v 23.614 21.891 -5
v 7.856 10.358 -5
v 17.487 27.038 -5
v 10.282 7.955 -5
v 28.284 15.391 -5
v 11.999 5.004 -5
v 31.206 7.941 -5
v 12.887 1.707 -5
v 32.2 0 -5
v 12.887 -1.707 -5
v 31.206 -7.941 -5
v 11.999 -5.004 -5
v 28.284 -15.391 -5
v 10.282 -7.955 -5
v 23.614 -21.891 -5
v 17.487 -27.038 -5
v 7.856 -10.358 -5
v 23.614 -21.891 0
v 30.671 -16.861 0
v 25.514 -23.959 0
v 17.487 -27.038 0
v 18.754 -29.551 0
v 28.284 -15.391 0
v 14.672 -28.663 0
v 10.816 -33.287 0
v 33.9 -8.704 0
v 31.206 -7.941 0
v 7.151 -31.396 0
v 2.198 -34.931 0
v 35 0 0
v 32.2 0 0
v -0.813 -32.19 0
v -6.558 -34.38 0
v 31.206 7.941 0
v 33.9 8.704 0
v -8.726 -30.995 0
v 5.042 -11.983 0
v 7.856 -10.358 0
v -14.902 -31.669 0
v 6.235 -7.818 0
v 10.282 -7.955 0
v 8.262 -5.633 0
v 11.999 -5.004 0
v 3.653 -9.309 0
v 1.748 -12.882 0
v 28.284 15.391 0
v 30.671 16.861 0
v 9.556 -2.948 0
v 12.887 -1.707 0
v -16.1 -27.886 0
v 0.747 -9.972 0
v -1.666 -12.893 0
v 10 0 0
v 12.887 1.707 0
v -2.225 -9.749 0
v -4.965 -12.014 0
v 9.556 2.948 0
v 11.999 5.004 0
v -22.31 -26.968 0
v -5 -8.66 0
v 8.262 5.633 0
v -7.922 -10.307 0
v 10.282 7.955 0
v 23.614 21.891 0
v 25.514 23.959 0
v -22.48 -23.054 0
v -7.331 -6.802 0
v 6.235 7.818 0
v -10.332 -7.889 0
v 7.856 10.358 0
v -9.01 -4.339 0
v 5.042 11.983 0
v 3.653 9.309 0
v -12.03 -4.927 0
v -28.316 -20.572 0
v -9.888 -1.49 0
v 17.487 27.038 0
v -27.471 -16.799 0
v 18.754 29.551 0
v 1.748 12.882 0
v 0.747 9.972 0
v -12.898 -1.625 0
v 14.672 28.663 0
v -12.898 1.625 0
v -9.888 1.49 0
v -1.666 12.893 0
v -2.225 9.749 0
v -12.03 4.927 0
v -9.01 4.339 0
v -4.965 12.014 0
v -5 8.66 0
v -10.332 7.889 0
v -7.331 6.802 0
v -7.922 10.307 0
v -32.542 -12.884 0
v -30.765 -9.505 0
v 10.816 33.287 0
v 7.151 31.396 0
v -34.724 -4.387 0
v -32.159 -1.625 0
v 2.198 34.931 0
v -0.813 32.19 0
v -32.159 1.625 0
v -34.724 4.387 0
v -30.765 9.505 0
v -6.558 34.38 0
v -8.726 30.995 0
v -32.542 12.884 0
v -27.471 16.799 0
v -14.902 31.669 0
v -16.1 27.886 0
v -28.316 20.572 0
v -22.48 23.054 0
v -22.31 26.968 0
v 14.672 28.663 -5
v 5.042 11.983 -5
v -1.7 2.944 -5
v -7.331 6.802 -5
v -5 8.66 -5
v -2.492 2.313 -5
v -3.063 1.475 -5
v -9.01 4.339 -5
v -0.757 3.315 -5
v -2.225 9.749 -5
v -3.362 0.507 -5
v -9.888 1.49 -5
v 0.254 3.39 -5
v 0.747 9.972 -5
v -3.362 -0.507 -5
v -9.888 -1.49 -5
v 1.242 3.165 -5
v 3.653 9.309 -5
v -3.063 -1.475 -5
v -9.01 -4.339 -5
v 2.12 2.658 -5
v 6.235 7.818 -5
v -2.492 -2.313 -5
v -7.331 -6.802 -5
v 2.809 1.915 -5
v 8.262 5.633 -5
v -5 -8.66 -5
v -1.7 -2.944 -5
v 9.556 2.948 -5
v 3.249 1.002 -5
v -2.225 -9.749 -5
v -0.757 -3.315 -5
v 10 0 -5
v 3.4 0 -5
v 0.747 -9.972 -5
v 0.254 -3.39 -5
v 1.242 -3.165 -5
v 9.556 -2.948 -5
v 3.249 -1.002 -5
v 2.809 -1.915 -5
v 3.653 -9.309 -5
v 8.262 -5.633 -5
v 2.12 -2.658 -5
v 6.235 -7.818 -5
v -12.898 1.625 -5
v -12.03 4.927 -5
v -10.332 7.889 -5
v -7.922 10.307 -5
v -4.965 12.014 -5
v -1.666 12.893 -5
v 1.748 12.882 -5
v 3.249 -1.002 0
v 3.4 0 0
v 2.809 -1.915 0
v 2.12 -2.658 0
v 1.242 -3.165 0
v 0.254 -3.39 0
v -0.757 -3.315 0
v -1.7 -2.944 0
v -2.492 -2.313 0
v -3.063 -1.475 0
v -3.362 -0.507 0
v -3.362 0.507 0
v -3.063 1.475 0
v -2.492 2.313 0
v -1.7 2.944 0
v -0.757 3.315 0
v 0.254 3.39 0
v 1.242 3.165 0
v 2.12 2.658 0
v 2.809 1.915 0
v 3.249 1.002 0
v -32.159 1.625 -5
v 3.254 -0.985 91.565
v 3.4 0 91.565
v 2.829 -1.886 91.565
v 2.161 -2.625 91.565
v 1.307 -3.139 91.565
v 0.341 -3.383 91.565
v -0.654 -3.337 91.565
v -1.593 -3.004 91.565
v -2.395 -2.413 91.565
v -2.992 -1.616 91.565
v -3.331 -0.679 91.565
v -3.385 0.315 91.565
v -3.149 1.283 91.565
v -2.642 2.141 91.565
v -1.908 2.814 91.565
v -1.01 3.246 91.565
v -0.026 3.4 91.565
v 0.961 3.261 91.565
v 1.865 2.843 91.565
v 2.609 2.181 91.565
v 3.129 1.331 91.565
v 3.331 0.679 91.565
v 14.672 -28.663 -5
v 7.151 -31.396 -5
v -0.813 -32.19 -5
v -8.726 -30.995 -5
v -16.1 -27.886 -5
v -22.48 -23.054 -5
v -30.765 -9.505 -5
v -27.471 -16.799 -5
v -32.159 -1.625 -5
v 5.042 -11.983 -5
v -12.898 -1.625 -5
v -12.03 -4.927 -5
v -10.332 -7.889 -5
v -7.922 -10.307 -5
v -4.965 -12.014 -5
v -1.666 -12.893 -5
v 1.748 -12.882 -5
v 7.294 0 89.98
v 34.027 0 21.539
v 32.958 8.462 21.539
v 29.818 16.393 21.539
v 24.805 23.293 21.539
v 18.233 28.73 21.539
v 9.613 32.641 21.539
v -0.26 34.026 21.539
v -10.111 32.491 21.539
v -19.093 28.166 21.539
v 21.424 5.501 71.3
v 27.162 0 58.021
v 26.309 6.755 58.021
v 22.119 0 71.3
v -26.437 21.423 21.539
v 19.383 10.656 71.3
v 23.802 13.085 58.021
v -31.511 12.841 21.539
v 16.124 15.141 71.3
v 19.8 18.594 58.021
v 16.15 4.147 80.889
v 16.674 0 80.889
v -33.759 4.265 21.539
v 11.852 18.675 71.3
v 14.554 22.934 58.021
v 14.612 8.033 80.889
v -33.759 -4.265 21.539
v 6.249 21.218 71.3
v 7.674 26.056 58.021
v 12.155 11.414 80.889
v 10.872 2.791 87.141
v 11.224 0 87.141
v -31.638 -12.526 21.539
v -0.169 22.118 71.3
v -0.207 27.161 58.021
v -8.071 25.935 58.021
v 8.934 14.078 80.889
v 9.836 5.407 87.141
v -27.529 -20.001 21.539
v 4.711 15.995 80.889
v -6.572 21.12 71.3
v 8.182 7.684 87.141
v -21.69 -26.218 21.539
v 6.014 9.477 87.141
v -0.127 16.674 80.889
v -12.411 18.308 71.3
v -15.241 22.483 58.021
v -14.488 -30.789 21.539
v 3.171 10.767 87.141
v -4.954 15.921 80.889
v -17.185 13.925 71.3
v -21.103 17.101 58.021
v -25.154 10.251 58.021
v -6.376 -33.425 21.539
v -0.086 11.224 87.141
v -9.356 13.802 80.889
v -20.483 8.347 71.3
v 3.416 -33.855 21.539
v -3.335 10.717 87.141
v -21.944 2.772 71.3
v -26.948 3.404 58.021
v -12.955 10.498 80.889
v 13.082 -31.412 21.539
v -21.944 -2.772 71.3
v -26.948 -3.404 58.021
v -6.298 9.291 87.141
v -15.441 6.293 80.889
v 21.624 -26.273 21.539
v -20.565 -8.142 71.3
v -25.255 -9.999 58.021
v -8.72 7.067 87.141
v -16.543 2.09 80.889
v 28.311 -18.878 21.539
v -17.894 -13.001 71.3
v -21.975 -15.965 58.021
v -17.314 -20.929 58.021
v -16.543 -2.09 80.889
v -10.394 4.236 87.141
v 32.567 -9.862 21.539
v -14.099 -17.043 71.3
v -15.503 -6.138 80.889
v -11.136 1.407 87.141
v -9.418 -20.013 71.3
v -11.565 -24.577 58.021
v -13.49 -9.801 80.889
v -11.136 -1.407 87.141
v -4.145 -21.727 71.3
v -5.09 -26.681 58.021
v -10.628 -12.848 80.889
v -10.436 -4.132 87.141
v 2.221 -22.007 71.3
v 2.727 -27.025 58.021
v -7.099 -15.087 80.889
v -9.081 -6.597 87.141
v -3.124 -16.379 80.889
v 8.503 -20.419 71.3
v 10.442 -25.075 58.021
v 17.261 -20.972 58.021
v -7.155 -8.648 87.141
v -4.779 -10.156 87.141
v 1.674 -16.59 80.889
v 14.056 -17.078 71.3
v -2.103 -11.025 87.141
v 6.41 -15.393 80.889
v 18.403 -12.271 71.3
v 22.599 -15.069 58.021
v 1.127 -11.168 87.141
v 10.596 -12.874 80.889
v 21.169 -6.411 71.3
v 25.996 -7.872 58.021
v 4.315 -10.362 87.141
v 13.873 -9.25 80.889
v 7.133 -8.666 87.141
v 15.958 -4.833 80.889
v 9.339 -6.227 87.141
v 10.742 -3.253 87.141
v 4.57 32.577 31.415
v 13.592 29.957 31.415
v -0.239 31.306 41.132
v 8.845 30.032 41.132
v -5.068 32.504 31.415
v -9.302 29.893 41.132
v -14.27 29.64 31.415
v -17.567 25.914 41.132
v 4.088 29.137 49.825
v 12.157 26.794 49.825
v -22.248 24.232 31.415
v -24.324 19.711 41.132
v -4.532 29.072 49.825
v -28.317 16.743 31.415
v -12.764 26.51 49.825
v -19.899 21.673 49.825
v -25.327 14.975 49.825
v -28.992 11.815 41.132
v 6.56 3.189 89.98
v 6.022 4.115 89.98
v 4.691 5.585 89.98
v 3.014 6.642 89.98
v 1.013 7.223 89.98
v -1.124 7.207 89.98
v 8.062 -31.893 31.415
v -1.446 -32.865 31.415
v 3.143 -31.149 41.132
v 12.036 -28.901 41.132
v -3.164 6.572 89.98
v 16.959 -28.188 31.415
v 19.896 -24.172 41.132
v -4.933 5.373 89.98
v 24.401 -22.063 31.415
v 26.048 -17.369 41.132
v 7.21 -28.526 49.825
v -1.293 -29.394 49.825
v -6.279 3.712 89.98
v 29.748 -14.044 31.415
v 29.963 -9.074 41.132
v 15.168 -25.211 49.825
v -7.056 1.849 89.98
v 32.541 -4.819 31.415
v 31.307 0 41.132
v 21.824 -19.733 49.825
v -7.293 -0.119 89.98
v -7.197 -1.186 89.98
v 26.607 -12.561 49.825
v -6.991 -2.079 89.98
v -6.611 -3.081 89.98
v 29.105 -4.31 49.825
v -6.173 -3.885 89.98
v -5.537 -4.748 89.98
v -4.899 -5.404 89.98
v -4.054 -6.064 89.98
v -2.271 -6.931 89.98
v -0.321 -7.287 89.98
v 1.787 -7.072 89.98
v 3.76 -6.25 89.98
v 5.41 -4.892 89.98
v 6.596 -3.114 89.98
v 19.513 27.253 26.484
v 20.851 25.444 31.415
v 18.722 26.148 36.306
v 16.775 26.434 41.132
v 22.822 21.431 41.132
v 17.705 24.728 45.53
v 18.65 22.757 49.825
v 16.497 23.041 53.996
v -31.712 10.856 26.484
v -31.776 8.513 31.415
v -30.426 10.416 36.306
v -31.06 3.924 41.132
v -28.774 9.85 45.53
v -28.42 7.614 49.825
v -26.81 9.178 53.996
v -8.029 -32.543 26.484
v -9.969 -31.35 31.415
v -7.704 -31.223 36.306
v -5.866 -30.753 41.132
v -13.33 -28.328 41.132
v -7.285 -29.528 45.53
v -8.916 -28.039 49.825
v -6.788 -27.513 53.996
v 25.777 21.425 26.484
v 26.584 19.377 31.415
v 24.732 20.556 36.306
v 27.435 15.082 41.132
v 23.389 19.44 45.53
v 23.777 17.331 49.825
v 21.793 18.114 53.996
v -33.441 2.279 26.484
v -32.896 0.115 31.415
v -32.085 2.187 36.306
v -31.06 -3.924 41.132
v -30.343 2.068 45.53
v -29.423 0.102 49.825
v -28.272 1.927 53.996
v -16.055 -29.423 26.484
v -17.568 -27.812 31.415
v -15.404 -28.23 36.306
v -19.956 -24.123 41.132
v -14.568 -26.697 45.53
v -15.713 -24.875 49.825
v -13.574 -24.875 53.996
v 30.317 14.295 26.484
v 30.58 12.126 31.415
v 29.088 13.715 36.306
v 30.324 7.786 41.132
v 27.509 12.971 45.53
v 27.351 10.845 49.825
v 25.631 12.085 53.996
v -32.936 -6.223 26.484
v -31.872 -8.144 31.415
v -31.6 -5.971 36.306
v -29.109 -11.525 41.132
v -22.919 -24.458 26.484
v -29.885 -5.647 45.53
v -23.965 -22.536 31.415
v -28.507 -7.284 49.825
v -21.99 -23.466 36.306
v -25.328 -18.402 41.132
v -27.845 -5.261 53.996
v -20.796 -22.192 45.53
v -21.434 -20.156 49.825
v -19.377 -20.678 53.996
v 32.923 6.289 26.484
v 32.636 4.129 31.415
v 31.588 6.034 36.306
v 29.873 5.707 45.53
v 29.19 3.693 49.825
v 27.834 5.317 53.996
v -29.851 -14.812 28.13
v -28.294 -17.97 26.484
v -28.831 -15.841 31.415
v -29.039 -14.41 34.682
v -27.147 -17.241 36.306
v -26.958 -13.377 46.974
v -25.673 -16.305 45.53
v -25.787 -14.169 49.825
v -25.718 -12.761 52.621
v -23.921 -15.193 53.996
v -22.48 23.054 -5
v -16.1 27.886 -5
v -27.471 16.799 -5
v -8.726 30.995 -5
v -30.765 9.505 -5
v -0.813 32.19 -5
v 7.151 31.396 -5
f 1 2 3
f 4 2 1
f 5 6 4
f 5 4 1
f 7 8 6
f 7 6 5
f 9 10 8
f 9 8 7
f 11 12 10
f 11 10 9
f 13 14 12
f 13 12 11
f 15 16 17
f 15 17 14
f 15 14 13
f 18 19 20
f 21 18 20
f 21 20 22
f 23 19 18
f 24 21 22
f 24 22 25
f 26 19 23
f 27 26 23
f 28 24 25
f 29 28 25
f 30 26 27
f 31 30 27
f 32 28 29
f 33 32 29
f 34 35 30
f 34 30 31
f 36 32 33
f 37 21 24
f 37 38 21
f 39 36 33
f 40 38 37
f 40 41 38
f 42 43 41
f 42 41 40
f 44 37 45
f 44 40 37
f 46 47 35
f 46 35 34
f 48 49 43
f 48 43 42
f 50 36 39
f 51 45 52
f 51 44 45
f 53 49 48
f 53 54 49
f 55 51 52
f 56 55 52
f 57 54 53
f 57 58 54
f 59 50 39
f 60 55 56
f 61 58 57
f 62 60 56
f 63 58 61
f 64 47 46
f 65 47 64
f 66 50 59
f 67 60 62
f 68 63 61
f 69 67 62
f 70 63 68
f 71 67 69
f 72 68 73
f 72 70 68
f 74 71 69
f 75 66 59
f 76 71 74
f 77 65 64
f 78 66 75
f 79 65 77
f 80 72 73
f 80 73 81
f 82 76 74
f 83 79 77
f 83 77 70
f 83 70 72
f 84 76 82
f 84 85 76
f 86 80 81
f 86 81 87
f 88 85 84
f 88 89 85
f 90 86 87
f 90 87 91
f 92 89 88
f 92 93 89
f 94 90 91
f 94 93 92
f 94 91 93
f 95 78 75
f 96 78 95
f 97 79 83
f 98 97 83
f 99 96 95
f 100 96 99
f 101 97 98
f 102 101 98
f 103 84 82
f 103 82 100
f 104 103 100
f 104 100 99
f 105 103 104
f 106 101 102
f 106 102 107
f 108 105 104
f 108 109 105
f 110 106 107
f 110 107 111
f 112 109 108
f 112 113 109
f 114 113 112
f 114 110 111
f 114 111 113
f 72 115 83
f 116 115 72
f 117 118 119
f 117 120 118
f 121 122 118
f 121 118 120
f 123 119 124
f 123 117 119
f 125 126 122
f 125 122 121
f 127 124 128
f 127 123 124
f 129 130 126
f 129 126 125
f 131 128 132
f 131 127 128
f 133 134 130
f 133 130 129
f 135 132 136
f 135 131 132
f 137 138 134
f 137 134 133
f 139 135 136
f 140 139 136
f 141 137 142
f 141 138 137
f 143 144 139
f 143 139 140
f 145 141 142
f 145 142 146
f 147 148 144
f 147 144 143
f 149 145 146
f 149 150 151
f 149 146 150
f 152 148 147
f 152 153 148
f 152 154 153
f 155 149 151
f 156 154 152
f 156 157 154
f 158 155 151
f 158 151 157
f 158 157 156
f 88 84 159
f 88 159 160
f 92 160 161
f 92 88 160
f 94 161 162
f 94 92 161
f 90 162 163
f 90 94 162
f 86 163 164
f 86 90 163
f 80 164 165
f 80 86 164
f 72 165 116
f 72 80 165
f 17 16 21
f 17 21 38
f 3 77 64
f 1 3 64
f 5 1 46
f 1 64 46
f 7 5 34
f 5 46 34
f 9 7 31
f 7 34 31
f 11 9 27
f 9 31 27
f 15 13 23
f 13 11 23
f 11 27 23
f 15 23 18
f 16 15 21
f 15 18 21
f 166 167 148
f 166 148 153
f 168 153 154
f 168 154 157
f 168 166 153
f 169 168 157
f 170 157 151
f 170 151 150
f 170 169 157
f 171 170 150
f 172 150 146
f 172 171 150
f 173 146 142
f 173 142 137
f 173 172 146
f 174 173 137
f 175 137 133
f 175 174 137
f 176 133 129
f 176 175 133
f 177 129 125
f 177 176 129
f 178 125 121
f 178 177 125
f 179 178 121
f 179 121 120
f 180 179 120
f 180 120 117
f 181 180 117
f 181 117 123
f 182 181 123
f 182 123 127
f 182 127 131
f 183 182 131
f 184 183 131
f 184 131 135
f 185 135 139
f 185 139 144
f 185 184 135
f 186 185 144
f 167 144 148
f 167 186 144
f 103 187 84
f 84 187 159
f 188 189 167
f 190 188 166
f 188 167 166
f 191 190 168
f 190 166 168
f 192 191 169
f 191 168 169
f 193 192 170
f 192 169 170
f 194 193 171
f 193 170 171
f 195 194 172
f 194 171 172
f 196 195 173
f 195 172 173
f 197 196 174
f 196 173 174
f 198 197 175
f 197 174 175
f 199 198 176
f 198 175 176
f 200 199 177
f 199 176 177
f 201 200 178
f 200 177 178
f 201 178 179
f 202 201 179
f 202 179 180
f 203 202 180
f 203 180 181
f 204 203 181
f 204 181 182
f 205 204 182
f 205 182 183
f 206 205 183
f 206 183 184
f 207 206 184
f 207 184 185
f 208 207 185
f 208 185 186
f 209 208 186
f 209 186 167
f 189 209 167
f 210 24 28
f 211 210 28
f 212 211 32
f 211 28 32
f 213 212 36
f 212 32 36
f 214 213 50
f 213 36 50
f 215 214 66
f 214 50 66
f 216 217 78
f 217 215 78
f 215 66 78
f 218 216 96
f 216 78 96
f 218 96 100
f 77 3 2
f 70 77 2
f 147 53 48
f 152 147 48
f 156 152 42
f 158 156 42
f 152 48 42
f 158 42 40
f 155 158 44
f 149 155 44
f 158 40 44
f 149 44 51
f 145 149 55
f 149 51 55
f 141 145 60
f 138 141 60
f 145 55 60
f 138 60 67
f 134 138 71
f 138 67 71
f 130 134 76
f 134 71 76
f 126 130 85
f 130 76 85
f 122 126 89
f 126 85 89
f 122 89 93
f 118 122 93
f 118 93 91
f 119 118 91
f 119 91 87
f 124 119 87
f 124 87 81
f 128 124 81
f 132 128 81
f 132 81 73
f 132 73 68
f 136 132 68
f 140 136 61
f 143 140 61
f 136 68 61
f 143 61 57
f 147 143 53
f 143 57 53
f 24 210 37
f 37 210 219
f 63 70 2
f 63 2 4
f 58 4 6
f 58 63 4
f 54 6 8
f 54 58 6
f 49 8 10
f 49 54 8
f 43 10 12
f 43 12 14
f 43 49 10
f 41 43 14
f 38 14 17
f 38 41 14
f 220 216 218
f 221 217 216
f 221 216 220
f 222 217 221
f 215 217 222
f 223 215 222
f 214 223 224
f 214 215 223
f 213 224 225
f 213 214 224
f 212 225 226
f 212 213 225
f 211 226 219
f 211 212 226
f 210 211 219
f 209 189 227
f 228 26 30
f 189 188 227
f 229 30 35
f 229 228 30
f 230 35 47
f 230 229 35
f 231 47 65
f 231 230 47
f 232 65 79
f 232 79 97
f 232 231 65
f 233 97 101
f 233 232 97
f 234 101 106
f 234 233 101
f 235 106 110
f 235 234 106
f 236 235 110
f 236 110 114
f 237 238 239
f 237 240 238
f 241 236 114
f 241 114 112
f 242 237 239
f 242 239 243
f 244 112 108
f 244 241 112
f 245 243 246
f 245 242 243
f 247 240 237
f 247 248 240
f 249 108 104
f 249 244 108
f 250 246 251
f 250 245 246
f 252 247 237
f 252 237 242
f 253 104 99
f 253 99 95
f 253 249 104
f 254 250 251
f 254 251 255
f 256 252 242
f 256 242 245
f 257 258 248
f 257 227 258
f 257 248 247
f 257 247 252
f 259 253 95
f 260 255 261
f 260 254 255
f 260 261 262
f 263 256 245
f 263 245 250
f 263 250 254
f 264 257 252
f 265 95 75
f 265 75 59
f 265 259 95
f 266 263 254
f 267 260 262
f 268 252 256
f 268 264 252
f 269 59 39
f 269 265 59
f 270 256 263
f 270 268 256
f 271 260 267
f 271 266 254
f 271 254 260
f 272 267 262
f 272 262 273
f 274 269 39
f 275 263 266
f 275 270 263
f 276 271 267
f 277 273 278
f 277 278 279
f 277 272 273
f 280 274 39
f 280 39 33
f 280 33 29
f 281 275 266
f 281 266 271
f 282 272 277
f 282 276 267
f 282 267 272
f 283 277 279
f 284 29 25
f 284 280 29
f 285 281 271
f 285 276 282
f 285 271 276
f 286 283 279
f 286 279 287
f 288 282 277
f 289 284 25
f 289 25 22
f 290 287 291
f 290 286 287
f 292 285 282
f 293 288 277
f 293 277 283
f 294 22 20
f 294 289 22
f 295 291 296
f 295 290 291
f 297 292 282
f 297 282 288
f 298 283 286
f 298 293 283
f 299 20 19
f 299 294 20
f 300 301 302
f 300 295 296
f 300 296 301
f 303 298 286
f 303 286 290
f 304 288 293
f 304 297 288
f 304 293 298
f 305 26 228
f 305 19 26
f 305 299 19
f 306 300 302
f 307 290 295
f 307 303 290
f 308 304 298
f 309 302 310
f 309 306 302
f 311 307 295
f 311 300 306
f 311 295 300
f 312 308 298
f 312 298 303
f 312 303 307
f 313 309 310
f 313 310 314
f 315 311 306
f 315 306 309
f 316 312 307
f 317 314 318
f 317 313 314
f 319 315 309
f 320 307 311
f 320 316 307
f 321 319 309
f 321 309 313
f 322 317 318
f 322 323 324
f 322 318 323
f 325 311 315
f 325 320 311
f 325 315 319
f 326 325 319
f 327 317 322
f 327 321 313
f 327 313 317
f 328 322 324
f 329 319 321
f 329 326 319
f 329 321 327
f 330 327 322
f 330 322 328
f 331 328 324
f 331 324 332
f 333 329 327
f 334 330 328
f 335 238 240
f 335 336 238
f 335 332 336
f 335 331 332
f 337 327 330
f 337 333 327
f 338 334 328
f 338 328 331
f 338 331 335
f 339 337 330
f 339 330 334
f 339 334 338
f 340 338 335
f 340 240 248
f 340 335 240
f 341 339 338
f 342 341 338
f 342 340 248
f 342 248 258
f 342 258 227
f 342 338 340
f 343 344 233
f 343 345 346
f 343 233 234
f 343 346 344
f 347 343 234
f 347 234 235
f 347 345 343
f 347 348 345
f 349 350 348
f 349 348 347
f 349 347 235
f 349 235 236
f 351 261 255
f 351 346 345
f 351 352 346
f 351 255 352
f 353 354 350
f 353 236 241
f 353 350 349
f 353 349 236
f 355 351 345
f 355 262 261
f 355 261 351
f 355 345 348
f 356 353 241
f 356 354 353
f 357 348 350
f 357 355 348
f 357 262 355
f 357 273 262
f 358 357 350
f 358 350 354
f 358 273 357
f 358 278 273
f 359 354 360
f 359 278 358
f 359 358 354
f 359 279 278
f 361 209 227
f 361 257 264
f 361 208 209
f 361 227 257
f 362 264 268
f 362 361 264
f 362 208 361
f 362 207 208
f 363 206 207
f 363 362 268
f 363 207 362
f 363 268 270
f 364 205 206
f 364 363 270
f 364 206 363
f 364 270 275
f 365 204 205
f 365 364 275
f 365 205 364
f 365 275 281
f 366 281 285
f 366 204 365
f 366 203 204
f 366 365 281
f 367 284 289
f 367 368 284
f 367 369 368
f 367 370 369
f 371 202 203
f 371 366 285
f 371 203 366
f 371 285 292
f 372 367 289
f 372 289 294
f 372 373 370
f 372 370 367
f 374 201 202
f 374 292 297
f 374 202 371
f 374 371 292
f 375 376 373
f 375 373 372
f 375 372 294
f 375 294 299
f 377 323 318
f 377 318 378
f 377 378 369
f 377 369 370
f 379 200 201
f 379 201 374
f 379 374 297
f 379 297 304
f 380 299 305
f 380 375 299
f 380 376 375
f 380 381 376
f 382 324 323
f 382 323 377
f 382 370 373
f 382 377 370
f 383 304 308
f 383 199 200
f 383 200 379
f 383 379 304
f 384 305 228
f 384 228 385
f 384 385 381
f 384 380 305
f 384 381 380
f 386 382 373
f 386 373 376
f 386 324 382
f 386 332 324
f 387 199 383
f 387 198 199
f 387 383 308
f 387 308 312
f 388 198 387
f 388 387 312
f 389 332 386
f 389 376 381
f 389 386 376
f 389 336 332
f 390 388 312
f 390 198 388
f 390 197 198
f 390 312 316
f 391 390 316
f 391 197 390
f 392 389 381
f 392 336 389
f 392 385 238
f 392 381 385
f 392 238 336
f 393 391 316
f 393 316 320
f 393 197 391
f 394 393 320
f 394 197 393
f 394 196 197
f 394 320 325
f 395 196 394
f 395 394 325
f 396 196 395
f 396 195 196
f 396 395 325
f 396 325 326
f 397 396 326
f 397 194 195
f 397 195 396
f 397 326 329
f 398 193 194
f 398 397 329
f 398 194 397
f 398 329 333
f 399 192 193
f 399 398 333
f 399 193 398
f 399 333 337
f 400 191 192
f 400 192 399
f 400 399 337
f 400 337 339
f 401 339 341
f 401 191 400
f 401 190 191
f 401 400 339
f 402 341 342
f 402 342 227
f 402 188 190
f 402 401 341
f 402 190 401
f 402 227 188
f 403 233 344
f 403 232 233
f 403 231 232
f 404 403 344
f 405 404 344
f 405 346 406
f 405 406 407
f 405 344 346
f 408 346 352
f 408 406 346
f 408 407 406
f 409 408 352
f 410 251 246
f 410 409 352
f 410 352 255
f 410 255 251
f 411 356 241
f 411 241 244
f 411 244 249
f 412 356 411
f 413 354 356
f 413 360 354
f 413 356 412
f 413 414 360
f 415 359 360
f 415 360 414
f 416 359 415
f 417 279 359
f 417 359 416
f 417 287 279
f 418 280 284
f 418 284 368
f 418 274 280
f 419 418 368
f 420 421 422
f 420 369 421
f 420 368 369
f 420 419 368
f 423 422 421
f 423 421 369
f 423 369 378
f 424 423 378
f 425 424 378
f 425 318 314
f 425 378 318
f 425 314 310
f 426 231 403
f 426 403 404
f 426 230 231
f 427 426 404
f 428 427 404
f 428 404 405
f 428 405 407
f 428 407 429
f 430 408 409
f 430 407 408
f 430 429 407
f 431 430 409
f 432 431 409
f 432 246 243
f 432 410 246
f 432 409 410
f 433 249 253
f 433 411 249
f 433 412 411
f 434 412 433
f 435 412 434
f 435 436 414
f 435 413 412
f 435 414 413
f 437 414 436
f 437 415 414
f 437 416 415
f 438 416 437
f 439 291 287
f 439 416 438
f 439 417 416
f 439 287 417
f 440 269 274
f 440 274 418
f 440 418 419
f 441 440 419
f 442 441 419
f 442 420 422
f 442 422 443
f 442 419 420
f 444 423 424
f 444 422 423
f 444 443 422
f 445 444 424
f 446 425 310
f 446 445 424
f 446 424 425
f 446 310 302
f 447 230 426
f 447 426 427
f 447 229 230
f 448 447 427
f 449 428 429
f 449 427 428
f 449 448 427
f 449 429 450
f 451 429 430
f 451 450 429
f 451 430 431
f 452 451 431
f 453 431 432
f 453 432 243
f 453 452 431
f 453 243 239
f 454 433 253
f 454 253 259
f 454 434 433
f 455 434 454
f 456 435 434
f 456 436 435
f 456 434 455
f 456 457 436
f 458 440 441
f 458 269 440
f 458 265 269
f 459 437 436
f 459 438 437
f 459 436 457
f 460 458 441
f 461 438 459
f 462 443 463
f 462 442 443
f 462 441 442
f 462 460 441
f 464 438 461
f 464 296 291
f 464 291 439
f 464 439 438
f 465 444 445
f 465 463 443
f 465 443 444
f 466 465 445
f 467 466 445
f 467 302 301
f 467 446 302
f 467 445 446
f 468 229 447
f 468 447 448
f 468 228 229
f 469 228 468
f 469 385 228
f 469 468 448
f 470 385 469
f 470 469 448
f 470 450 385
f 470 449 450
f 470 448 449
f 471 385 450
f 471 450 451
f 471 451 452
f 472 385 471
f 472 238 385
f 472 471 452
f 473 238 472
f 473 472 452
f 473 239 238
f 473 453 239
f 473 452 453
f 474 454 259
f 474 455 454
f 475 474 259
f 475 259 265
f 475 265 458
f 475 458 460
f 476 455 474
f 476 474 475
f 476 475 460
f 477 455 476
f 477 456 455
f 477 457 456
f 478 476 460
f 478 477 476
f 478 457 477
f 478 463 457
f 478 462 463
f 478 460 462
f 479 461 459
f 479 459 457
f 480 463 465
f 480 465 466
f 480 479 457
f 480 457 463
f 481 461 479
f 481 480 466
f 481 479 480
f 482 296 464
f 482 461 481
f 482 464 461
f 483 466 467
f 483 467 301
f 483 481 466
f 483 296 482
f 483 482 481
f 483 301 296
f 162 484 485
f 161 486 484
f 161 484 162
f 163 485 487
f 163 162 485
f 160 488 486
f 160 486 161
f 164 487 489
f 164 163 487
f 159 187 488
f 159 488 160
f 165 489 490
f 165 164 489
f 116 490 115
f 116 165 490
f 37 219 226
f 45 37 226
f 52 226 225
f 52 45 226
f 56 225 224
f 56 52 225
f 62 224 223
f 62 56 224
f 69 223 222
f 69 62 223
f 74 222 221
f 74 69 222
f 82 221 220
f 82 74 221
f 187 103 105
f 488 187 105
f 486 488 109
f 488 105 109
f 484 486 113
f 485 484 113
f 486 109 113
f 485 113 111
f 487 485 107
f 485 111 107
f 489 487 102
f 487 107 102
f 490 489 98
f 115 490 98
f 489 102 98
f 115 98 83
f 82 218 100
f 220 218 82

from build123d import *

# Parameters (mm, degrees)
SKETCH002_R          = 10
PAD_DEPTH            = 5
SKETCH003_R          = 32.2
SKETCH003_R_2        = 13
PAD001_DEPTH         = 5
SKETCH004_W          = 28.033752
SKETCH004_H          = 3.25
POCKET_DEPTH         = 5
POLARPATTERN_COUNT   = 3
SKETCH001_R          = 3.4
POCKET001_DEPTH      = 200
POCKET001_DEPTH_BACK = -5


with BuildPart() as part:
    # Sketch → Revolution (revolve)
    with BuildSketch(Plane.XZ):
        with BuildLine():
            add(Edge.make_bspline(
                [(35, 0), (35, 92), (0, 92)],
                knots=[4.712389, 4.712389, 4.712389, 6.283185, 6.283185, 6.283185], degree=2, weights=[1, 0.707107, 1]))
            Line((0, 92), (0, 0))
            Line((0, 0), (35, 0))
        make_face()
    revolve(axis=Axis((0, 0, 0), (0, 0, 1)))

    # Sketch002 (on Face2 of Revolution) → Pad (new body)
    with BuildSketch(Plane(origin=(0, 0, 0), x_dir=(1, 0, 0), z_dir=(0, 0, -1))):
        Circle(SKETCH002_R)
    extrude(amount=PAD_DEPTH)

    # Sketch003 (on Face2 of Pad) → Pad001 (join)
    with BuildSketch(Plane(origin=(0, 0, 0), x_dir=(1, 0, 0), z_dir=(0, 0, -1))):
        Circle(SKETCH003_R)
        Circle(SKETCH003_R_2, mode=Mode.SUBTRACT)
    extrude(amount=PAD001_DEPTH)

    # Sketch004 (on Face4 of Pad001) → Pocket (cut)
    with BuildSketch(Plane(origin=(0, 0, -5), x_dir=(1, 0, 0), z_dir=(0, 0, -1))):
        with Locations((-25.270624, 0)):
            Rectangle(SKETCH004_W, SKETCH004_H)
    pocket = extrude(amount=-POCKET_DEPTH, mode=Mode.SUBTRACT)

    # PolarPattern: Pocket ×3 about axis
    polarpattern_axis = Axis((0, 0, -5), (0, 0, -1))
    for i in range(1, POLARPATTERN_COUNT):
        add(pocket.rotate(polarpattern_axis, i * 360 / POLARPATTERN_COUNT), mode=Mode.SUBTRACT)

    # Sketch001 (on Face2 of Revolution) → Pocket001 (cut, two sides)
    with BuildSketch(Plane(origin=(0, 0, 0), x_dir=(1, 0, 0), z_dir=(0, 0, -1))) as pocket001_sk:
        Circle(SKETCH001_R)
    extrude(amount=-POCKET001_DEPTH, mode=Mode.SUBTRACT)
    extrude(pocket001_sk.sketch, amount=-POCKET001_DEPTH_BACK, mode=Mode.SUBTRACT)


solid = part.part
